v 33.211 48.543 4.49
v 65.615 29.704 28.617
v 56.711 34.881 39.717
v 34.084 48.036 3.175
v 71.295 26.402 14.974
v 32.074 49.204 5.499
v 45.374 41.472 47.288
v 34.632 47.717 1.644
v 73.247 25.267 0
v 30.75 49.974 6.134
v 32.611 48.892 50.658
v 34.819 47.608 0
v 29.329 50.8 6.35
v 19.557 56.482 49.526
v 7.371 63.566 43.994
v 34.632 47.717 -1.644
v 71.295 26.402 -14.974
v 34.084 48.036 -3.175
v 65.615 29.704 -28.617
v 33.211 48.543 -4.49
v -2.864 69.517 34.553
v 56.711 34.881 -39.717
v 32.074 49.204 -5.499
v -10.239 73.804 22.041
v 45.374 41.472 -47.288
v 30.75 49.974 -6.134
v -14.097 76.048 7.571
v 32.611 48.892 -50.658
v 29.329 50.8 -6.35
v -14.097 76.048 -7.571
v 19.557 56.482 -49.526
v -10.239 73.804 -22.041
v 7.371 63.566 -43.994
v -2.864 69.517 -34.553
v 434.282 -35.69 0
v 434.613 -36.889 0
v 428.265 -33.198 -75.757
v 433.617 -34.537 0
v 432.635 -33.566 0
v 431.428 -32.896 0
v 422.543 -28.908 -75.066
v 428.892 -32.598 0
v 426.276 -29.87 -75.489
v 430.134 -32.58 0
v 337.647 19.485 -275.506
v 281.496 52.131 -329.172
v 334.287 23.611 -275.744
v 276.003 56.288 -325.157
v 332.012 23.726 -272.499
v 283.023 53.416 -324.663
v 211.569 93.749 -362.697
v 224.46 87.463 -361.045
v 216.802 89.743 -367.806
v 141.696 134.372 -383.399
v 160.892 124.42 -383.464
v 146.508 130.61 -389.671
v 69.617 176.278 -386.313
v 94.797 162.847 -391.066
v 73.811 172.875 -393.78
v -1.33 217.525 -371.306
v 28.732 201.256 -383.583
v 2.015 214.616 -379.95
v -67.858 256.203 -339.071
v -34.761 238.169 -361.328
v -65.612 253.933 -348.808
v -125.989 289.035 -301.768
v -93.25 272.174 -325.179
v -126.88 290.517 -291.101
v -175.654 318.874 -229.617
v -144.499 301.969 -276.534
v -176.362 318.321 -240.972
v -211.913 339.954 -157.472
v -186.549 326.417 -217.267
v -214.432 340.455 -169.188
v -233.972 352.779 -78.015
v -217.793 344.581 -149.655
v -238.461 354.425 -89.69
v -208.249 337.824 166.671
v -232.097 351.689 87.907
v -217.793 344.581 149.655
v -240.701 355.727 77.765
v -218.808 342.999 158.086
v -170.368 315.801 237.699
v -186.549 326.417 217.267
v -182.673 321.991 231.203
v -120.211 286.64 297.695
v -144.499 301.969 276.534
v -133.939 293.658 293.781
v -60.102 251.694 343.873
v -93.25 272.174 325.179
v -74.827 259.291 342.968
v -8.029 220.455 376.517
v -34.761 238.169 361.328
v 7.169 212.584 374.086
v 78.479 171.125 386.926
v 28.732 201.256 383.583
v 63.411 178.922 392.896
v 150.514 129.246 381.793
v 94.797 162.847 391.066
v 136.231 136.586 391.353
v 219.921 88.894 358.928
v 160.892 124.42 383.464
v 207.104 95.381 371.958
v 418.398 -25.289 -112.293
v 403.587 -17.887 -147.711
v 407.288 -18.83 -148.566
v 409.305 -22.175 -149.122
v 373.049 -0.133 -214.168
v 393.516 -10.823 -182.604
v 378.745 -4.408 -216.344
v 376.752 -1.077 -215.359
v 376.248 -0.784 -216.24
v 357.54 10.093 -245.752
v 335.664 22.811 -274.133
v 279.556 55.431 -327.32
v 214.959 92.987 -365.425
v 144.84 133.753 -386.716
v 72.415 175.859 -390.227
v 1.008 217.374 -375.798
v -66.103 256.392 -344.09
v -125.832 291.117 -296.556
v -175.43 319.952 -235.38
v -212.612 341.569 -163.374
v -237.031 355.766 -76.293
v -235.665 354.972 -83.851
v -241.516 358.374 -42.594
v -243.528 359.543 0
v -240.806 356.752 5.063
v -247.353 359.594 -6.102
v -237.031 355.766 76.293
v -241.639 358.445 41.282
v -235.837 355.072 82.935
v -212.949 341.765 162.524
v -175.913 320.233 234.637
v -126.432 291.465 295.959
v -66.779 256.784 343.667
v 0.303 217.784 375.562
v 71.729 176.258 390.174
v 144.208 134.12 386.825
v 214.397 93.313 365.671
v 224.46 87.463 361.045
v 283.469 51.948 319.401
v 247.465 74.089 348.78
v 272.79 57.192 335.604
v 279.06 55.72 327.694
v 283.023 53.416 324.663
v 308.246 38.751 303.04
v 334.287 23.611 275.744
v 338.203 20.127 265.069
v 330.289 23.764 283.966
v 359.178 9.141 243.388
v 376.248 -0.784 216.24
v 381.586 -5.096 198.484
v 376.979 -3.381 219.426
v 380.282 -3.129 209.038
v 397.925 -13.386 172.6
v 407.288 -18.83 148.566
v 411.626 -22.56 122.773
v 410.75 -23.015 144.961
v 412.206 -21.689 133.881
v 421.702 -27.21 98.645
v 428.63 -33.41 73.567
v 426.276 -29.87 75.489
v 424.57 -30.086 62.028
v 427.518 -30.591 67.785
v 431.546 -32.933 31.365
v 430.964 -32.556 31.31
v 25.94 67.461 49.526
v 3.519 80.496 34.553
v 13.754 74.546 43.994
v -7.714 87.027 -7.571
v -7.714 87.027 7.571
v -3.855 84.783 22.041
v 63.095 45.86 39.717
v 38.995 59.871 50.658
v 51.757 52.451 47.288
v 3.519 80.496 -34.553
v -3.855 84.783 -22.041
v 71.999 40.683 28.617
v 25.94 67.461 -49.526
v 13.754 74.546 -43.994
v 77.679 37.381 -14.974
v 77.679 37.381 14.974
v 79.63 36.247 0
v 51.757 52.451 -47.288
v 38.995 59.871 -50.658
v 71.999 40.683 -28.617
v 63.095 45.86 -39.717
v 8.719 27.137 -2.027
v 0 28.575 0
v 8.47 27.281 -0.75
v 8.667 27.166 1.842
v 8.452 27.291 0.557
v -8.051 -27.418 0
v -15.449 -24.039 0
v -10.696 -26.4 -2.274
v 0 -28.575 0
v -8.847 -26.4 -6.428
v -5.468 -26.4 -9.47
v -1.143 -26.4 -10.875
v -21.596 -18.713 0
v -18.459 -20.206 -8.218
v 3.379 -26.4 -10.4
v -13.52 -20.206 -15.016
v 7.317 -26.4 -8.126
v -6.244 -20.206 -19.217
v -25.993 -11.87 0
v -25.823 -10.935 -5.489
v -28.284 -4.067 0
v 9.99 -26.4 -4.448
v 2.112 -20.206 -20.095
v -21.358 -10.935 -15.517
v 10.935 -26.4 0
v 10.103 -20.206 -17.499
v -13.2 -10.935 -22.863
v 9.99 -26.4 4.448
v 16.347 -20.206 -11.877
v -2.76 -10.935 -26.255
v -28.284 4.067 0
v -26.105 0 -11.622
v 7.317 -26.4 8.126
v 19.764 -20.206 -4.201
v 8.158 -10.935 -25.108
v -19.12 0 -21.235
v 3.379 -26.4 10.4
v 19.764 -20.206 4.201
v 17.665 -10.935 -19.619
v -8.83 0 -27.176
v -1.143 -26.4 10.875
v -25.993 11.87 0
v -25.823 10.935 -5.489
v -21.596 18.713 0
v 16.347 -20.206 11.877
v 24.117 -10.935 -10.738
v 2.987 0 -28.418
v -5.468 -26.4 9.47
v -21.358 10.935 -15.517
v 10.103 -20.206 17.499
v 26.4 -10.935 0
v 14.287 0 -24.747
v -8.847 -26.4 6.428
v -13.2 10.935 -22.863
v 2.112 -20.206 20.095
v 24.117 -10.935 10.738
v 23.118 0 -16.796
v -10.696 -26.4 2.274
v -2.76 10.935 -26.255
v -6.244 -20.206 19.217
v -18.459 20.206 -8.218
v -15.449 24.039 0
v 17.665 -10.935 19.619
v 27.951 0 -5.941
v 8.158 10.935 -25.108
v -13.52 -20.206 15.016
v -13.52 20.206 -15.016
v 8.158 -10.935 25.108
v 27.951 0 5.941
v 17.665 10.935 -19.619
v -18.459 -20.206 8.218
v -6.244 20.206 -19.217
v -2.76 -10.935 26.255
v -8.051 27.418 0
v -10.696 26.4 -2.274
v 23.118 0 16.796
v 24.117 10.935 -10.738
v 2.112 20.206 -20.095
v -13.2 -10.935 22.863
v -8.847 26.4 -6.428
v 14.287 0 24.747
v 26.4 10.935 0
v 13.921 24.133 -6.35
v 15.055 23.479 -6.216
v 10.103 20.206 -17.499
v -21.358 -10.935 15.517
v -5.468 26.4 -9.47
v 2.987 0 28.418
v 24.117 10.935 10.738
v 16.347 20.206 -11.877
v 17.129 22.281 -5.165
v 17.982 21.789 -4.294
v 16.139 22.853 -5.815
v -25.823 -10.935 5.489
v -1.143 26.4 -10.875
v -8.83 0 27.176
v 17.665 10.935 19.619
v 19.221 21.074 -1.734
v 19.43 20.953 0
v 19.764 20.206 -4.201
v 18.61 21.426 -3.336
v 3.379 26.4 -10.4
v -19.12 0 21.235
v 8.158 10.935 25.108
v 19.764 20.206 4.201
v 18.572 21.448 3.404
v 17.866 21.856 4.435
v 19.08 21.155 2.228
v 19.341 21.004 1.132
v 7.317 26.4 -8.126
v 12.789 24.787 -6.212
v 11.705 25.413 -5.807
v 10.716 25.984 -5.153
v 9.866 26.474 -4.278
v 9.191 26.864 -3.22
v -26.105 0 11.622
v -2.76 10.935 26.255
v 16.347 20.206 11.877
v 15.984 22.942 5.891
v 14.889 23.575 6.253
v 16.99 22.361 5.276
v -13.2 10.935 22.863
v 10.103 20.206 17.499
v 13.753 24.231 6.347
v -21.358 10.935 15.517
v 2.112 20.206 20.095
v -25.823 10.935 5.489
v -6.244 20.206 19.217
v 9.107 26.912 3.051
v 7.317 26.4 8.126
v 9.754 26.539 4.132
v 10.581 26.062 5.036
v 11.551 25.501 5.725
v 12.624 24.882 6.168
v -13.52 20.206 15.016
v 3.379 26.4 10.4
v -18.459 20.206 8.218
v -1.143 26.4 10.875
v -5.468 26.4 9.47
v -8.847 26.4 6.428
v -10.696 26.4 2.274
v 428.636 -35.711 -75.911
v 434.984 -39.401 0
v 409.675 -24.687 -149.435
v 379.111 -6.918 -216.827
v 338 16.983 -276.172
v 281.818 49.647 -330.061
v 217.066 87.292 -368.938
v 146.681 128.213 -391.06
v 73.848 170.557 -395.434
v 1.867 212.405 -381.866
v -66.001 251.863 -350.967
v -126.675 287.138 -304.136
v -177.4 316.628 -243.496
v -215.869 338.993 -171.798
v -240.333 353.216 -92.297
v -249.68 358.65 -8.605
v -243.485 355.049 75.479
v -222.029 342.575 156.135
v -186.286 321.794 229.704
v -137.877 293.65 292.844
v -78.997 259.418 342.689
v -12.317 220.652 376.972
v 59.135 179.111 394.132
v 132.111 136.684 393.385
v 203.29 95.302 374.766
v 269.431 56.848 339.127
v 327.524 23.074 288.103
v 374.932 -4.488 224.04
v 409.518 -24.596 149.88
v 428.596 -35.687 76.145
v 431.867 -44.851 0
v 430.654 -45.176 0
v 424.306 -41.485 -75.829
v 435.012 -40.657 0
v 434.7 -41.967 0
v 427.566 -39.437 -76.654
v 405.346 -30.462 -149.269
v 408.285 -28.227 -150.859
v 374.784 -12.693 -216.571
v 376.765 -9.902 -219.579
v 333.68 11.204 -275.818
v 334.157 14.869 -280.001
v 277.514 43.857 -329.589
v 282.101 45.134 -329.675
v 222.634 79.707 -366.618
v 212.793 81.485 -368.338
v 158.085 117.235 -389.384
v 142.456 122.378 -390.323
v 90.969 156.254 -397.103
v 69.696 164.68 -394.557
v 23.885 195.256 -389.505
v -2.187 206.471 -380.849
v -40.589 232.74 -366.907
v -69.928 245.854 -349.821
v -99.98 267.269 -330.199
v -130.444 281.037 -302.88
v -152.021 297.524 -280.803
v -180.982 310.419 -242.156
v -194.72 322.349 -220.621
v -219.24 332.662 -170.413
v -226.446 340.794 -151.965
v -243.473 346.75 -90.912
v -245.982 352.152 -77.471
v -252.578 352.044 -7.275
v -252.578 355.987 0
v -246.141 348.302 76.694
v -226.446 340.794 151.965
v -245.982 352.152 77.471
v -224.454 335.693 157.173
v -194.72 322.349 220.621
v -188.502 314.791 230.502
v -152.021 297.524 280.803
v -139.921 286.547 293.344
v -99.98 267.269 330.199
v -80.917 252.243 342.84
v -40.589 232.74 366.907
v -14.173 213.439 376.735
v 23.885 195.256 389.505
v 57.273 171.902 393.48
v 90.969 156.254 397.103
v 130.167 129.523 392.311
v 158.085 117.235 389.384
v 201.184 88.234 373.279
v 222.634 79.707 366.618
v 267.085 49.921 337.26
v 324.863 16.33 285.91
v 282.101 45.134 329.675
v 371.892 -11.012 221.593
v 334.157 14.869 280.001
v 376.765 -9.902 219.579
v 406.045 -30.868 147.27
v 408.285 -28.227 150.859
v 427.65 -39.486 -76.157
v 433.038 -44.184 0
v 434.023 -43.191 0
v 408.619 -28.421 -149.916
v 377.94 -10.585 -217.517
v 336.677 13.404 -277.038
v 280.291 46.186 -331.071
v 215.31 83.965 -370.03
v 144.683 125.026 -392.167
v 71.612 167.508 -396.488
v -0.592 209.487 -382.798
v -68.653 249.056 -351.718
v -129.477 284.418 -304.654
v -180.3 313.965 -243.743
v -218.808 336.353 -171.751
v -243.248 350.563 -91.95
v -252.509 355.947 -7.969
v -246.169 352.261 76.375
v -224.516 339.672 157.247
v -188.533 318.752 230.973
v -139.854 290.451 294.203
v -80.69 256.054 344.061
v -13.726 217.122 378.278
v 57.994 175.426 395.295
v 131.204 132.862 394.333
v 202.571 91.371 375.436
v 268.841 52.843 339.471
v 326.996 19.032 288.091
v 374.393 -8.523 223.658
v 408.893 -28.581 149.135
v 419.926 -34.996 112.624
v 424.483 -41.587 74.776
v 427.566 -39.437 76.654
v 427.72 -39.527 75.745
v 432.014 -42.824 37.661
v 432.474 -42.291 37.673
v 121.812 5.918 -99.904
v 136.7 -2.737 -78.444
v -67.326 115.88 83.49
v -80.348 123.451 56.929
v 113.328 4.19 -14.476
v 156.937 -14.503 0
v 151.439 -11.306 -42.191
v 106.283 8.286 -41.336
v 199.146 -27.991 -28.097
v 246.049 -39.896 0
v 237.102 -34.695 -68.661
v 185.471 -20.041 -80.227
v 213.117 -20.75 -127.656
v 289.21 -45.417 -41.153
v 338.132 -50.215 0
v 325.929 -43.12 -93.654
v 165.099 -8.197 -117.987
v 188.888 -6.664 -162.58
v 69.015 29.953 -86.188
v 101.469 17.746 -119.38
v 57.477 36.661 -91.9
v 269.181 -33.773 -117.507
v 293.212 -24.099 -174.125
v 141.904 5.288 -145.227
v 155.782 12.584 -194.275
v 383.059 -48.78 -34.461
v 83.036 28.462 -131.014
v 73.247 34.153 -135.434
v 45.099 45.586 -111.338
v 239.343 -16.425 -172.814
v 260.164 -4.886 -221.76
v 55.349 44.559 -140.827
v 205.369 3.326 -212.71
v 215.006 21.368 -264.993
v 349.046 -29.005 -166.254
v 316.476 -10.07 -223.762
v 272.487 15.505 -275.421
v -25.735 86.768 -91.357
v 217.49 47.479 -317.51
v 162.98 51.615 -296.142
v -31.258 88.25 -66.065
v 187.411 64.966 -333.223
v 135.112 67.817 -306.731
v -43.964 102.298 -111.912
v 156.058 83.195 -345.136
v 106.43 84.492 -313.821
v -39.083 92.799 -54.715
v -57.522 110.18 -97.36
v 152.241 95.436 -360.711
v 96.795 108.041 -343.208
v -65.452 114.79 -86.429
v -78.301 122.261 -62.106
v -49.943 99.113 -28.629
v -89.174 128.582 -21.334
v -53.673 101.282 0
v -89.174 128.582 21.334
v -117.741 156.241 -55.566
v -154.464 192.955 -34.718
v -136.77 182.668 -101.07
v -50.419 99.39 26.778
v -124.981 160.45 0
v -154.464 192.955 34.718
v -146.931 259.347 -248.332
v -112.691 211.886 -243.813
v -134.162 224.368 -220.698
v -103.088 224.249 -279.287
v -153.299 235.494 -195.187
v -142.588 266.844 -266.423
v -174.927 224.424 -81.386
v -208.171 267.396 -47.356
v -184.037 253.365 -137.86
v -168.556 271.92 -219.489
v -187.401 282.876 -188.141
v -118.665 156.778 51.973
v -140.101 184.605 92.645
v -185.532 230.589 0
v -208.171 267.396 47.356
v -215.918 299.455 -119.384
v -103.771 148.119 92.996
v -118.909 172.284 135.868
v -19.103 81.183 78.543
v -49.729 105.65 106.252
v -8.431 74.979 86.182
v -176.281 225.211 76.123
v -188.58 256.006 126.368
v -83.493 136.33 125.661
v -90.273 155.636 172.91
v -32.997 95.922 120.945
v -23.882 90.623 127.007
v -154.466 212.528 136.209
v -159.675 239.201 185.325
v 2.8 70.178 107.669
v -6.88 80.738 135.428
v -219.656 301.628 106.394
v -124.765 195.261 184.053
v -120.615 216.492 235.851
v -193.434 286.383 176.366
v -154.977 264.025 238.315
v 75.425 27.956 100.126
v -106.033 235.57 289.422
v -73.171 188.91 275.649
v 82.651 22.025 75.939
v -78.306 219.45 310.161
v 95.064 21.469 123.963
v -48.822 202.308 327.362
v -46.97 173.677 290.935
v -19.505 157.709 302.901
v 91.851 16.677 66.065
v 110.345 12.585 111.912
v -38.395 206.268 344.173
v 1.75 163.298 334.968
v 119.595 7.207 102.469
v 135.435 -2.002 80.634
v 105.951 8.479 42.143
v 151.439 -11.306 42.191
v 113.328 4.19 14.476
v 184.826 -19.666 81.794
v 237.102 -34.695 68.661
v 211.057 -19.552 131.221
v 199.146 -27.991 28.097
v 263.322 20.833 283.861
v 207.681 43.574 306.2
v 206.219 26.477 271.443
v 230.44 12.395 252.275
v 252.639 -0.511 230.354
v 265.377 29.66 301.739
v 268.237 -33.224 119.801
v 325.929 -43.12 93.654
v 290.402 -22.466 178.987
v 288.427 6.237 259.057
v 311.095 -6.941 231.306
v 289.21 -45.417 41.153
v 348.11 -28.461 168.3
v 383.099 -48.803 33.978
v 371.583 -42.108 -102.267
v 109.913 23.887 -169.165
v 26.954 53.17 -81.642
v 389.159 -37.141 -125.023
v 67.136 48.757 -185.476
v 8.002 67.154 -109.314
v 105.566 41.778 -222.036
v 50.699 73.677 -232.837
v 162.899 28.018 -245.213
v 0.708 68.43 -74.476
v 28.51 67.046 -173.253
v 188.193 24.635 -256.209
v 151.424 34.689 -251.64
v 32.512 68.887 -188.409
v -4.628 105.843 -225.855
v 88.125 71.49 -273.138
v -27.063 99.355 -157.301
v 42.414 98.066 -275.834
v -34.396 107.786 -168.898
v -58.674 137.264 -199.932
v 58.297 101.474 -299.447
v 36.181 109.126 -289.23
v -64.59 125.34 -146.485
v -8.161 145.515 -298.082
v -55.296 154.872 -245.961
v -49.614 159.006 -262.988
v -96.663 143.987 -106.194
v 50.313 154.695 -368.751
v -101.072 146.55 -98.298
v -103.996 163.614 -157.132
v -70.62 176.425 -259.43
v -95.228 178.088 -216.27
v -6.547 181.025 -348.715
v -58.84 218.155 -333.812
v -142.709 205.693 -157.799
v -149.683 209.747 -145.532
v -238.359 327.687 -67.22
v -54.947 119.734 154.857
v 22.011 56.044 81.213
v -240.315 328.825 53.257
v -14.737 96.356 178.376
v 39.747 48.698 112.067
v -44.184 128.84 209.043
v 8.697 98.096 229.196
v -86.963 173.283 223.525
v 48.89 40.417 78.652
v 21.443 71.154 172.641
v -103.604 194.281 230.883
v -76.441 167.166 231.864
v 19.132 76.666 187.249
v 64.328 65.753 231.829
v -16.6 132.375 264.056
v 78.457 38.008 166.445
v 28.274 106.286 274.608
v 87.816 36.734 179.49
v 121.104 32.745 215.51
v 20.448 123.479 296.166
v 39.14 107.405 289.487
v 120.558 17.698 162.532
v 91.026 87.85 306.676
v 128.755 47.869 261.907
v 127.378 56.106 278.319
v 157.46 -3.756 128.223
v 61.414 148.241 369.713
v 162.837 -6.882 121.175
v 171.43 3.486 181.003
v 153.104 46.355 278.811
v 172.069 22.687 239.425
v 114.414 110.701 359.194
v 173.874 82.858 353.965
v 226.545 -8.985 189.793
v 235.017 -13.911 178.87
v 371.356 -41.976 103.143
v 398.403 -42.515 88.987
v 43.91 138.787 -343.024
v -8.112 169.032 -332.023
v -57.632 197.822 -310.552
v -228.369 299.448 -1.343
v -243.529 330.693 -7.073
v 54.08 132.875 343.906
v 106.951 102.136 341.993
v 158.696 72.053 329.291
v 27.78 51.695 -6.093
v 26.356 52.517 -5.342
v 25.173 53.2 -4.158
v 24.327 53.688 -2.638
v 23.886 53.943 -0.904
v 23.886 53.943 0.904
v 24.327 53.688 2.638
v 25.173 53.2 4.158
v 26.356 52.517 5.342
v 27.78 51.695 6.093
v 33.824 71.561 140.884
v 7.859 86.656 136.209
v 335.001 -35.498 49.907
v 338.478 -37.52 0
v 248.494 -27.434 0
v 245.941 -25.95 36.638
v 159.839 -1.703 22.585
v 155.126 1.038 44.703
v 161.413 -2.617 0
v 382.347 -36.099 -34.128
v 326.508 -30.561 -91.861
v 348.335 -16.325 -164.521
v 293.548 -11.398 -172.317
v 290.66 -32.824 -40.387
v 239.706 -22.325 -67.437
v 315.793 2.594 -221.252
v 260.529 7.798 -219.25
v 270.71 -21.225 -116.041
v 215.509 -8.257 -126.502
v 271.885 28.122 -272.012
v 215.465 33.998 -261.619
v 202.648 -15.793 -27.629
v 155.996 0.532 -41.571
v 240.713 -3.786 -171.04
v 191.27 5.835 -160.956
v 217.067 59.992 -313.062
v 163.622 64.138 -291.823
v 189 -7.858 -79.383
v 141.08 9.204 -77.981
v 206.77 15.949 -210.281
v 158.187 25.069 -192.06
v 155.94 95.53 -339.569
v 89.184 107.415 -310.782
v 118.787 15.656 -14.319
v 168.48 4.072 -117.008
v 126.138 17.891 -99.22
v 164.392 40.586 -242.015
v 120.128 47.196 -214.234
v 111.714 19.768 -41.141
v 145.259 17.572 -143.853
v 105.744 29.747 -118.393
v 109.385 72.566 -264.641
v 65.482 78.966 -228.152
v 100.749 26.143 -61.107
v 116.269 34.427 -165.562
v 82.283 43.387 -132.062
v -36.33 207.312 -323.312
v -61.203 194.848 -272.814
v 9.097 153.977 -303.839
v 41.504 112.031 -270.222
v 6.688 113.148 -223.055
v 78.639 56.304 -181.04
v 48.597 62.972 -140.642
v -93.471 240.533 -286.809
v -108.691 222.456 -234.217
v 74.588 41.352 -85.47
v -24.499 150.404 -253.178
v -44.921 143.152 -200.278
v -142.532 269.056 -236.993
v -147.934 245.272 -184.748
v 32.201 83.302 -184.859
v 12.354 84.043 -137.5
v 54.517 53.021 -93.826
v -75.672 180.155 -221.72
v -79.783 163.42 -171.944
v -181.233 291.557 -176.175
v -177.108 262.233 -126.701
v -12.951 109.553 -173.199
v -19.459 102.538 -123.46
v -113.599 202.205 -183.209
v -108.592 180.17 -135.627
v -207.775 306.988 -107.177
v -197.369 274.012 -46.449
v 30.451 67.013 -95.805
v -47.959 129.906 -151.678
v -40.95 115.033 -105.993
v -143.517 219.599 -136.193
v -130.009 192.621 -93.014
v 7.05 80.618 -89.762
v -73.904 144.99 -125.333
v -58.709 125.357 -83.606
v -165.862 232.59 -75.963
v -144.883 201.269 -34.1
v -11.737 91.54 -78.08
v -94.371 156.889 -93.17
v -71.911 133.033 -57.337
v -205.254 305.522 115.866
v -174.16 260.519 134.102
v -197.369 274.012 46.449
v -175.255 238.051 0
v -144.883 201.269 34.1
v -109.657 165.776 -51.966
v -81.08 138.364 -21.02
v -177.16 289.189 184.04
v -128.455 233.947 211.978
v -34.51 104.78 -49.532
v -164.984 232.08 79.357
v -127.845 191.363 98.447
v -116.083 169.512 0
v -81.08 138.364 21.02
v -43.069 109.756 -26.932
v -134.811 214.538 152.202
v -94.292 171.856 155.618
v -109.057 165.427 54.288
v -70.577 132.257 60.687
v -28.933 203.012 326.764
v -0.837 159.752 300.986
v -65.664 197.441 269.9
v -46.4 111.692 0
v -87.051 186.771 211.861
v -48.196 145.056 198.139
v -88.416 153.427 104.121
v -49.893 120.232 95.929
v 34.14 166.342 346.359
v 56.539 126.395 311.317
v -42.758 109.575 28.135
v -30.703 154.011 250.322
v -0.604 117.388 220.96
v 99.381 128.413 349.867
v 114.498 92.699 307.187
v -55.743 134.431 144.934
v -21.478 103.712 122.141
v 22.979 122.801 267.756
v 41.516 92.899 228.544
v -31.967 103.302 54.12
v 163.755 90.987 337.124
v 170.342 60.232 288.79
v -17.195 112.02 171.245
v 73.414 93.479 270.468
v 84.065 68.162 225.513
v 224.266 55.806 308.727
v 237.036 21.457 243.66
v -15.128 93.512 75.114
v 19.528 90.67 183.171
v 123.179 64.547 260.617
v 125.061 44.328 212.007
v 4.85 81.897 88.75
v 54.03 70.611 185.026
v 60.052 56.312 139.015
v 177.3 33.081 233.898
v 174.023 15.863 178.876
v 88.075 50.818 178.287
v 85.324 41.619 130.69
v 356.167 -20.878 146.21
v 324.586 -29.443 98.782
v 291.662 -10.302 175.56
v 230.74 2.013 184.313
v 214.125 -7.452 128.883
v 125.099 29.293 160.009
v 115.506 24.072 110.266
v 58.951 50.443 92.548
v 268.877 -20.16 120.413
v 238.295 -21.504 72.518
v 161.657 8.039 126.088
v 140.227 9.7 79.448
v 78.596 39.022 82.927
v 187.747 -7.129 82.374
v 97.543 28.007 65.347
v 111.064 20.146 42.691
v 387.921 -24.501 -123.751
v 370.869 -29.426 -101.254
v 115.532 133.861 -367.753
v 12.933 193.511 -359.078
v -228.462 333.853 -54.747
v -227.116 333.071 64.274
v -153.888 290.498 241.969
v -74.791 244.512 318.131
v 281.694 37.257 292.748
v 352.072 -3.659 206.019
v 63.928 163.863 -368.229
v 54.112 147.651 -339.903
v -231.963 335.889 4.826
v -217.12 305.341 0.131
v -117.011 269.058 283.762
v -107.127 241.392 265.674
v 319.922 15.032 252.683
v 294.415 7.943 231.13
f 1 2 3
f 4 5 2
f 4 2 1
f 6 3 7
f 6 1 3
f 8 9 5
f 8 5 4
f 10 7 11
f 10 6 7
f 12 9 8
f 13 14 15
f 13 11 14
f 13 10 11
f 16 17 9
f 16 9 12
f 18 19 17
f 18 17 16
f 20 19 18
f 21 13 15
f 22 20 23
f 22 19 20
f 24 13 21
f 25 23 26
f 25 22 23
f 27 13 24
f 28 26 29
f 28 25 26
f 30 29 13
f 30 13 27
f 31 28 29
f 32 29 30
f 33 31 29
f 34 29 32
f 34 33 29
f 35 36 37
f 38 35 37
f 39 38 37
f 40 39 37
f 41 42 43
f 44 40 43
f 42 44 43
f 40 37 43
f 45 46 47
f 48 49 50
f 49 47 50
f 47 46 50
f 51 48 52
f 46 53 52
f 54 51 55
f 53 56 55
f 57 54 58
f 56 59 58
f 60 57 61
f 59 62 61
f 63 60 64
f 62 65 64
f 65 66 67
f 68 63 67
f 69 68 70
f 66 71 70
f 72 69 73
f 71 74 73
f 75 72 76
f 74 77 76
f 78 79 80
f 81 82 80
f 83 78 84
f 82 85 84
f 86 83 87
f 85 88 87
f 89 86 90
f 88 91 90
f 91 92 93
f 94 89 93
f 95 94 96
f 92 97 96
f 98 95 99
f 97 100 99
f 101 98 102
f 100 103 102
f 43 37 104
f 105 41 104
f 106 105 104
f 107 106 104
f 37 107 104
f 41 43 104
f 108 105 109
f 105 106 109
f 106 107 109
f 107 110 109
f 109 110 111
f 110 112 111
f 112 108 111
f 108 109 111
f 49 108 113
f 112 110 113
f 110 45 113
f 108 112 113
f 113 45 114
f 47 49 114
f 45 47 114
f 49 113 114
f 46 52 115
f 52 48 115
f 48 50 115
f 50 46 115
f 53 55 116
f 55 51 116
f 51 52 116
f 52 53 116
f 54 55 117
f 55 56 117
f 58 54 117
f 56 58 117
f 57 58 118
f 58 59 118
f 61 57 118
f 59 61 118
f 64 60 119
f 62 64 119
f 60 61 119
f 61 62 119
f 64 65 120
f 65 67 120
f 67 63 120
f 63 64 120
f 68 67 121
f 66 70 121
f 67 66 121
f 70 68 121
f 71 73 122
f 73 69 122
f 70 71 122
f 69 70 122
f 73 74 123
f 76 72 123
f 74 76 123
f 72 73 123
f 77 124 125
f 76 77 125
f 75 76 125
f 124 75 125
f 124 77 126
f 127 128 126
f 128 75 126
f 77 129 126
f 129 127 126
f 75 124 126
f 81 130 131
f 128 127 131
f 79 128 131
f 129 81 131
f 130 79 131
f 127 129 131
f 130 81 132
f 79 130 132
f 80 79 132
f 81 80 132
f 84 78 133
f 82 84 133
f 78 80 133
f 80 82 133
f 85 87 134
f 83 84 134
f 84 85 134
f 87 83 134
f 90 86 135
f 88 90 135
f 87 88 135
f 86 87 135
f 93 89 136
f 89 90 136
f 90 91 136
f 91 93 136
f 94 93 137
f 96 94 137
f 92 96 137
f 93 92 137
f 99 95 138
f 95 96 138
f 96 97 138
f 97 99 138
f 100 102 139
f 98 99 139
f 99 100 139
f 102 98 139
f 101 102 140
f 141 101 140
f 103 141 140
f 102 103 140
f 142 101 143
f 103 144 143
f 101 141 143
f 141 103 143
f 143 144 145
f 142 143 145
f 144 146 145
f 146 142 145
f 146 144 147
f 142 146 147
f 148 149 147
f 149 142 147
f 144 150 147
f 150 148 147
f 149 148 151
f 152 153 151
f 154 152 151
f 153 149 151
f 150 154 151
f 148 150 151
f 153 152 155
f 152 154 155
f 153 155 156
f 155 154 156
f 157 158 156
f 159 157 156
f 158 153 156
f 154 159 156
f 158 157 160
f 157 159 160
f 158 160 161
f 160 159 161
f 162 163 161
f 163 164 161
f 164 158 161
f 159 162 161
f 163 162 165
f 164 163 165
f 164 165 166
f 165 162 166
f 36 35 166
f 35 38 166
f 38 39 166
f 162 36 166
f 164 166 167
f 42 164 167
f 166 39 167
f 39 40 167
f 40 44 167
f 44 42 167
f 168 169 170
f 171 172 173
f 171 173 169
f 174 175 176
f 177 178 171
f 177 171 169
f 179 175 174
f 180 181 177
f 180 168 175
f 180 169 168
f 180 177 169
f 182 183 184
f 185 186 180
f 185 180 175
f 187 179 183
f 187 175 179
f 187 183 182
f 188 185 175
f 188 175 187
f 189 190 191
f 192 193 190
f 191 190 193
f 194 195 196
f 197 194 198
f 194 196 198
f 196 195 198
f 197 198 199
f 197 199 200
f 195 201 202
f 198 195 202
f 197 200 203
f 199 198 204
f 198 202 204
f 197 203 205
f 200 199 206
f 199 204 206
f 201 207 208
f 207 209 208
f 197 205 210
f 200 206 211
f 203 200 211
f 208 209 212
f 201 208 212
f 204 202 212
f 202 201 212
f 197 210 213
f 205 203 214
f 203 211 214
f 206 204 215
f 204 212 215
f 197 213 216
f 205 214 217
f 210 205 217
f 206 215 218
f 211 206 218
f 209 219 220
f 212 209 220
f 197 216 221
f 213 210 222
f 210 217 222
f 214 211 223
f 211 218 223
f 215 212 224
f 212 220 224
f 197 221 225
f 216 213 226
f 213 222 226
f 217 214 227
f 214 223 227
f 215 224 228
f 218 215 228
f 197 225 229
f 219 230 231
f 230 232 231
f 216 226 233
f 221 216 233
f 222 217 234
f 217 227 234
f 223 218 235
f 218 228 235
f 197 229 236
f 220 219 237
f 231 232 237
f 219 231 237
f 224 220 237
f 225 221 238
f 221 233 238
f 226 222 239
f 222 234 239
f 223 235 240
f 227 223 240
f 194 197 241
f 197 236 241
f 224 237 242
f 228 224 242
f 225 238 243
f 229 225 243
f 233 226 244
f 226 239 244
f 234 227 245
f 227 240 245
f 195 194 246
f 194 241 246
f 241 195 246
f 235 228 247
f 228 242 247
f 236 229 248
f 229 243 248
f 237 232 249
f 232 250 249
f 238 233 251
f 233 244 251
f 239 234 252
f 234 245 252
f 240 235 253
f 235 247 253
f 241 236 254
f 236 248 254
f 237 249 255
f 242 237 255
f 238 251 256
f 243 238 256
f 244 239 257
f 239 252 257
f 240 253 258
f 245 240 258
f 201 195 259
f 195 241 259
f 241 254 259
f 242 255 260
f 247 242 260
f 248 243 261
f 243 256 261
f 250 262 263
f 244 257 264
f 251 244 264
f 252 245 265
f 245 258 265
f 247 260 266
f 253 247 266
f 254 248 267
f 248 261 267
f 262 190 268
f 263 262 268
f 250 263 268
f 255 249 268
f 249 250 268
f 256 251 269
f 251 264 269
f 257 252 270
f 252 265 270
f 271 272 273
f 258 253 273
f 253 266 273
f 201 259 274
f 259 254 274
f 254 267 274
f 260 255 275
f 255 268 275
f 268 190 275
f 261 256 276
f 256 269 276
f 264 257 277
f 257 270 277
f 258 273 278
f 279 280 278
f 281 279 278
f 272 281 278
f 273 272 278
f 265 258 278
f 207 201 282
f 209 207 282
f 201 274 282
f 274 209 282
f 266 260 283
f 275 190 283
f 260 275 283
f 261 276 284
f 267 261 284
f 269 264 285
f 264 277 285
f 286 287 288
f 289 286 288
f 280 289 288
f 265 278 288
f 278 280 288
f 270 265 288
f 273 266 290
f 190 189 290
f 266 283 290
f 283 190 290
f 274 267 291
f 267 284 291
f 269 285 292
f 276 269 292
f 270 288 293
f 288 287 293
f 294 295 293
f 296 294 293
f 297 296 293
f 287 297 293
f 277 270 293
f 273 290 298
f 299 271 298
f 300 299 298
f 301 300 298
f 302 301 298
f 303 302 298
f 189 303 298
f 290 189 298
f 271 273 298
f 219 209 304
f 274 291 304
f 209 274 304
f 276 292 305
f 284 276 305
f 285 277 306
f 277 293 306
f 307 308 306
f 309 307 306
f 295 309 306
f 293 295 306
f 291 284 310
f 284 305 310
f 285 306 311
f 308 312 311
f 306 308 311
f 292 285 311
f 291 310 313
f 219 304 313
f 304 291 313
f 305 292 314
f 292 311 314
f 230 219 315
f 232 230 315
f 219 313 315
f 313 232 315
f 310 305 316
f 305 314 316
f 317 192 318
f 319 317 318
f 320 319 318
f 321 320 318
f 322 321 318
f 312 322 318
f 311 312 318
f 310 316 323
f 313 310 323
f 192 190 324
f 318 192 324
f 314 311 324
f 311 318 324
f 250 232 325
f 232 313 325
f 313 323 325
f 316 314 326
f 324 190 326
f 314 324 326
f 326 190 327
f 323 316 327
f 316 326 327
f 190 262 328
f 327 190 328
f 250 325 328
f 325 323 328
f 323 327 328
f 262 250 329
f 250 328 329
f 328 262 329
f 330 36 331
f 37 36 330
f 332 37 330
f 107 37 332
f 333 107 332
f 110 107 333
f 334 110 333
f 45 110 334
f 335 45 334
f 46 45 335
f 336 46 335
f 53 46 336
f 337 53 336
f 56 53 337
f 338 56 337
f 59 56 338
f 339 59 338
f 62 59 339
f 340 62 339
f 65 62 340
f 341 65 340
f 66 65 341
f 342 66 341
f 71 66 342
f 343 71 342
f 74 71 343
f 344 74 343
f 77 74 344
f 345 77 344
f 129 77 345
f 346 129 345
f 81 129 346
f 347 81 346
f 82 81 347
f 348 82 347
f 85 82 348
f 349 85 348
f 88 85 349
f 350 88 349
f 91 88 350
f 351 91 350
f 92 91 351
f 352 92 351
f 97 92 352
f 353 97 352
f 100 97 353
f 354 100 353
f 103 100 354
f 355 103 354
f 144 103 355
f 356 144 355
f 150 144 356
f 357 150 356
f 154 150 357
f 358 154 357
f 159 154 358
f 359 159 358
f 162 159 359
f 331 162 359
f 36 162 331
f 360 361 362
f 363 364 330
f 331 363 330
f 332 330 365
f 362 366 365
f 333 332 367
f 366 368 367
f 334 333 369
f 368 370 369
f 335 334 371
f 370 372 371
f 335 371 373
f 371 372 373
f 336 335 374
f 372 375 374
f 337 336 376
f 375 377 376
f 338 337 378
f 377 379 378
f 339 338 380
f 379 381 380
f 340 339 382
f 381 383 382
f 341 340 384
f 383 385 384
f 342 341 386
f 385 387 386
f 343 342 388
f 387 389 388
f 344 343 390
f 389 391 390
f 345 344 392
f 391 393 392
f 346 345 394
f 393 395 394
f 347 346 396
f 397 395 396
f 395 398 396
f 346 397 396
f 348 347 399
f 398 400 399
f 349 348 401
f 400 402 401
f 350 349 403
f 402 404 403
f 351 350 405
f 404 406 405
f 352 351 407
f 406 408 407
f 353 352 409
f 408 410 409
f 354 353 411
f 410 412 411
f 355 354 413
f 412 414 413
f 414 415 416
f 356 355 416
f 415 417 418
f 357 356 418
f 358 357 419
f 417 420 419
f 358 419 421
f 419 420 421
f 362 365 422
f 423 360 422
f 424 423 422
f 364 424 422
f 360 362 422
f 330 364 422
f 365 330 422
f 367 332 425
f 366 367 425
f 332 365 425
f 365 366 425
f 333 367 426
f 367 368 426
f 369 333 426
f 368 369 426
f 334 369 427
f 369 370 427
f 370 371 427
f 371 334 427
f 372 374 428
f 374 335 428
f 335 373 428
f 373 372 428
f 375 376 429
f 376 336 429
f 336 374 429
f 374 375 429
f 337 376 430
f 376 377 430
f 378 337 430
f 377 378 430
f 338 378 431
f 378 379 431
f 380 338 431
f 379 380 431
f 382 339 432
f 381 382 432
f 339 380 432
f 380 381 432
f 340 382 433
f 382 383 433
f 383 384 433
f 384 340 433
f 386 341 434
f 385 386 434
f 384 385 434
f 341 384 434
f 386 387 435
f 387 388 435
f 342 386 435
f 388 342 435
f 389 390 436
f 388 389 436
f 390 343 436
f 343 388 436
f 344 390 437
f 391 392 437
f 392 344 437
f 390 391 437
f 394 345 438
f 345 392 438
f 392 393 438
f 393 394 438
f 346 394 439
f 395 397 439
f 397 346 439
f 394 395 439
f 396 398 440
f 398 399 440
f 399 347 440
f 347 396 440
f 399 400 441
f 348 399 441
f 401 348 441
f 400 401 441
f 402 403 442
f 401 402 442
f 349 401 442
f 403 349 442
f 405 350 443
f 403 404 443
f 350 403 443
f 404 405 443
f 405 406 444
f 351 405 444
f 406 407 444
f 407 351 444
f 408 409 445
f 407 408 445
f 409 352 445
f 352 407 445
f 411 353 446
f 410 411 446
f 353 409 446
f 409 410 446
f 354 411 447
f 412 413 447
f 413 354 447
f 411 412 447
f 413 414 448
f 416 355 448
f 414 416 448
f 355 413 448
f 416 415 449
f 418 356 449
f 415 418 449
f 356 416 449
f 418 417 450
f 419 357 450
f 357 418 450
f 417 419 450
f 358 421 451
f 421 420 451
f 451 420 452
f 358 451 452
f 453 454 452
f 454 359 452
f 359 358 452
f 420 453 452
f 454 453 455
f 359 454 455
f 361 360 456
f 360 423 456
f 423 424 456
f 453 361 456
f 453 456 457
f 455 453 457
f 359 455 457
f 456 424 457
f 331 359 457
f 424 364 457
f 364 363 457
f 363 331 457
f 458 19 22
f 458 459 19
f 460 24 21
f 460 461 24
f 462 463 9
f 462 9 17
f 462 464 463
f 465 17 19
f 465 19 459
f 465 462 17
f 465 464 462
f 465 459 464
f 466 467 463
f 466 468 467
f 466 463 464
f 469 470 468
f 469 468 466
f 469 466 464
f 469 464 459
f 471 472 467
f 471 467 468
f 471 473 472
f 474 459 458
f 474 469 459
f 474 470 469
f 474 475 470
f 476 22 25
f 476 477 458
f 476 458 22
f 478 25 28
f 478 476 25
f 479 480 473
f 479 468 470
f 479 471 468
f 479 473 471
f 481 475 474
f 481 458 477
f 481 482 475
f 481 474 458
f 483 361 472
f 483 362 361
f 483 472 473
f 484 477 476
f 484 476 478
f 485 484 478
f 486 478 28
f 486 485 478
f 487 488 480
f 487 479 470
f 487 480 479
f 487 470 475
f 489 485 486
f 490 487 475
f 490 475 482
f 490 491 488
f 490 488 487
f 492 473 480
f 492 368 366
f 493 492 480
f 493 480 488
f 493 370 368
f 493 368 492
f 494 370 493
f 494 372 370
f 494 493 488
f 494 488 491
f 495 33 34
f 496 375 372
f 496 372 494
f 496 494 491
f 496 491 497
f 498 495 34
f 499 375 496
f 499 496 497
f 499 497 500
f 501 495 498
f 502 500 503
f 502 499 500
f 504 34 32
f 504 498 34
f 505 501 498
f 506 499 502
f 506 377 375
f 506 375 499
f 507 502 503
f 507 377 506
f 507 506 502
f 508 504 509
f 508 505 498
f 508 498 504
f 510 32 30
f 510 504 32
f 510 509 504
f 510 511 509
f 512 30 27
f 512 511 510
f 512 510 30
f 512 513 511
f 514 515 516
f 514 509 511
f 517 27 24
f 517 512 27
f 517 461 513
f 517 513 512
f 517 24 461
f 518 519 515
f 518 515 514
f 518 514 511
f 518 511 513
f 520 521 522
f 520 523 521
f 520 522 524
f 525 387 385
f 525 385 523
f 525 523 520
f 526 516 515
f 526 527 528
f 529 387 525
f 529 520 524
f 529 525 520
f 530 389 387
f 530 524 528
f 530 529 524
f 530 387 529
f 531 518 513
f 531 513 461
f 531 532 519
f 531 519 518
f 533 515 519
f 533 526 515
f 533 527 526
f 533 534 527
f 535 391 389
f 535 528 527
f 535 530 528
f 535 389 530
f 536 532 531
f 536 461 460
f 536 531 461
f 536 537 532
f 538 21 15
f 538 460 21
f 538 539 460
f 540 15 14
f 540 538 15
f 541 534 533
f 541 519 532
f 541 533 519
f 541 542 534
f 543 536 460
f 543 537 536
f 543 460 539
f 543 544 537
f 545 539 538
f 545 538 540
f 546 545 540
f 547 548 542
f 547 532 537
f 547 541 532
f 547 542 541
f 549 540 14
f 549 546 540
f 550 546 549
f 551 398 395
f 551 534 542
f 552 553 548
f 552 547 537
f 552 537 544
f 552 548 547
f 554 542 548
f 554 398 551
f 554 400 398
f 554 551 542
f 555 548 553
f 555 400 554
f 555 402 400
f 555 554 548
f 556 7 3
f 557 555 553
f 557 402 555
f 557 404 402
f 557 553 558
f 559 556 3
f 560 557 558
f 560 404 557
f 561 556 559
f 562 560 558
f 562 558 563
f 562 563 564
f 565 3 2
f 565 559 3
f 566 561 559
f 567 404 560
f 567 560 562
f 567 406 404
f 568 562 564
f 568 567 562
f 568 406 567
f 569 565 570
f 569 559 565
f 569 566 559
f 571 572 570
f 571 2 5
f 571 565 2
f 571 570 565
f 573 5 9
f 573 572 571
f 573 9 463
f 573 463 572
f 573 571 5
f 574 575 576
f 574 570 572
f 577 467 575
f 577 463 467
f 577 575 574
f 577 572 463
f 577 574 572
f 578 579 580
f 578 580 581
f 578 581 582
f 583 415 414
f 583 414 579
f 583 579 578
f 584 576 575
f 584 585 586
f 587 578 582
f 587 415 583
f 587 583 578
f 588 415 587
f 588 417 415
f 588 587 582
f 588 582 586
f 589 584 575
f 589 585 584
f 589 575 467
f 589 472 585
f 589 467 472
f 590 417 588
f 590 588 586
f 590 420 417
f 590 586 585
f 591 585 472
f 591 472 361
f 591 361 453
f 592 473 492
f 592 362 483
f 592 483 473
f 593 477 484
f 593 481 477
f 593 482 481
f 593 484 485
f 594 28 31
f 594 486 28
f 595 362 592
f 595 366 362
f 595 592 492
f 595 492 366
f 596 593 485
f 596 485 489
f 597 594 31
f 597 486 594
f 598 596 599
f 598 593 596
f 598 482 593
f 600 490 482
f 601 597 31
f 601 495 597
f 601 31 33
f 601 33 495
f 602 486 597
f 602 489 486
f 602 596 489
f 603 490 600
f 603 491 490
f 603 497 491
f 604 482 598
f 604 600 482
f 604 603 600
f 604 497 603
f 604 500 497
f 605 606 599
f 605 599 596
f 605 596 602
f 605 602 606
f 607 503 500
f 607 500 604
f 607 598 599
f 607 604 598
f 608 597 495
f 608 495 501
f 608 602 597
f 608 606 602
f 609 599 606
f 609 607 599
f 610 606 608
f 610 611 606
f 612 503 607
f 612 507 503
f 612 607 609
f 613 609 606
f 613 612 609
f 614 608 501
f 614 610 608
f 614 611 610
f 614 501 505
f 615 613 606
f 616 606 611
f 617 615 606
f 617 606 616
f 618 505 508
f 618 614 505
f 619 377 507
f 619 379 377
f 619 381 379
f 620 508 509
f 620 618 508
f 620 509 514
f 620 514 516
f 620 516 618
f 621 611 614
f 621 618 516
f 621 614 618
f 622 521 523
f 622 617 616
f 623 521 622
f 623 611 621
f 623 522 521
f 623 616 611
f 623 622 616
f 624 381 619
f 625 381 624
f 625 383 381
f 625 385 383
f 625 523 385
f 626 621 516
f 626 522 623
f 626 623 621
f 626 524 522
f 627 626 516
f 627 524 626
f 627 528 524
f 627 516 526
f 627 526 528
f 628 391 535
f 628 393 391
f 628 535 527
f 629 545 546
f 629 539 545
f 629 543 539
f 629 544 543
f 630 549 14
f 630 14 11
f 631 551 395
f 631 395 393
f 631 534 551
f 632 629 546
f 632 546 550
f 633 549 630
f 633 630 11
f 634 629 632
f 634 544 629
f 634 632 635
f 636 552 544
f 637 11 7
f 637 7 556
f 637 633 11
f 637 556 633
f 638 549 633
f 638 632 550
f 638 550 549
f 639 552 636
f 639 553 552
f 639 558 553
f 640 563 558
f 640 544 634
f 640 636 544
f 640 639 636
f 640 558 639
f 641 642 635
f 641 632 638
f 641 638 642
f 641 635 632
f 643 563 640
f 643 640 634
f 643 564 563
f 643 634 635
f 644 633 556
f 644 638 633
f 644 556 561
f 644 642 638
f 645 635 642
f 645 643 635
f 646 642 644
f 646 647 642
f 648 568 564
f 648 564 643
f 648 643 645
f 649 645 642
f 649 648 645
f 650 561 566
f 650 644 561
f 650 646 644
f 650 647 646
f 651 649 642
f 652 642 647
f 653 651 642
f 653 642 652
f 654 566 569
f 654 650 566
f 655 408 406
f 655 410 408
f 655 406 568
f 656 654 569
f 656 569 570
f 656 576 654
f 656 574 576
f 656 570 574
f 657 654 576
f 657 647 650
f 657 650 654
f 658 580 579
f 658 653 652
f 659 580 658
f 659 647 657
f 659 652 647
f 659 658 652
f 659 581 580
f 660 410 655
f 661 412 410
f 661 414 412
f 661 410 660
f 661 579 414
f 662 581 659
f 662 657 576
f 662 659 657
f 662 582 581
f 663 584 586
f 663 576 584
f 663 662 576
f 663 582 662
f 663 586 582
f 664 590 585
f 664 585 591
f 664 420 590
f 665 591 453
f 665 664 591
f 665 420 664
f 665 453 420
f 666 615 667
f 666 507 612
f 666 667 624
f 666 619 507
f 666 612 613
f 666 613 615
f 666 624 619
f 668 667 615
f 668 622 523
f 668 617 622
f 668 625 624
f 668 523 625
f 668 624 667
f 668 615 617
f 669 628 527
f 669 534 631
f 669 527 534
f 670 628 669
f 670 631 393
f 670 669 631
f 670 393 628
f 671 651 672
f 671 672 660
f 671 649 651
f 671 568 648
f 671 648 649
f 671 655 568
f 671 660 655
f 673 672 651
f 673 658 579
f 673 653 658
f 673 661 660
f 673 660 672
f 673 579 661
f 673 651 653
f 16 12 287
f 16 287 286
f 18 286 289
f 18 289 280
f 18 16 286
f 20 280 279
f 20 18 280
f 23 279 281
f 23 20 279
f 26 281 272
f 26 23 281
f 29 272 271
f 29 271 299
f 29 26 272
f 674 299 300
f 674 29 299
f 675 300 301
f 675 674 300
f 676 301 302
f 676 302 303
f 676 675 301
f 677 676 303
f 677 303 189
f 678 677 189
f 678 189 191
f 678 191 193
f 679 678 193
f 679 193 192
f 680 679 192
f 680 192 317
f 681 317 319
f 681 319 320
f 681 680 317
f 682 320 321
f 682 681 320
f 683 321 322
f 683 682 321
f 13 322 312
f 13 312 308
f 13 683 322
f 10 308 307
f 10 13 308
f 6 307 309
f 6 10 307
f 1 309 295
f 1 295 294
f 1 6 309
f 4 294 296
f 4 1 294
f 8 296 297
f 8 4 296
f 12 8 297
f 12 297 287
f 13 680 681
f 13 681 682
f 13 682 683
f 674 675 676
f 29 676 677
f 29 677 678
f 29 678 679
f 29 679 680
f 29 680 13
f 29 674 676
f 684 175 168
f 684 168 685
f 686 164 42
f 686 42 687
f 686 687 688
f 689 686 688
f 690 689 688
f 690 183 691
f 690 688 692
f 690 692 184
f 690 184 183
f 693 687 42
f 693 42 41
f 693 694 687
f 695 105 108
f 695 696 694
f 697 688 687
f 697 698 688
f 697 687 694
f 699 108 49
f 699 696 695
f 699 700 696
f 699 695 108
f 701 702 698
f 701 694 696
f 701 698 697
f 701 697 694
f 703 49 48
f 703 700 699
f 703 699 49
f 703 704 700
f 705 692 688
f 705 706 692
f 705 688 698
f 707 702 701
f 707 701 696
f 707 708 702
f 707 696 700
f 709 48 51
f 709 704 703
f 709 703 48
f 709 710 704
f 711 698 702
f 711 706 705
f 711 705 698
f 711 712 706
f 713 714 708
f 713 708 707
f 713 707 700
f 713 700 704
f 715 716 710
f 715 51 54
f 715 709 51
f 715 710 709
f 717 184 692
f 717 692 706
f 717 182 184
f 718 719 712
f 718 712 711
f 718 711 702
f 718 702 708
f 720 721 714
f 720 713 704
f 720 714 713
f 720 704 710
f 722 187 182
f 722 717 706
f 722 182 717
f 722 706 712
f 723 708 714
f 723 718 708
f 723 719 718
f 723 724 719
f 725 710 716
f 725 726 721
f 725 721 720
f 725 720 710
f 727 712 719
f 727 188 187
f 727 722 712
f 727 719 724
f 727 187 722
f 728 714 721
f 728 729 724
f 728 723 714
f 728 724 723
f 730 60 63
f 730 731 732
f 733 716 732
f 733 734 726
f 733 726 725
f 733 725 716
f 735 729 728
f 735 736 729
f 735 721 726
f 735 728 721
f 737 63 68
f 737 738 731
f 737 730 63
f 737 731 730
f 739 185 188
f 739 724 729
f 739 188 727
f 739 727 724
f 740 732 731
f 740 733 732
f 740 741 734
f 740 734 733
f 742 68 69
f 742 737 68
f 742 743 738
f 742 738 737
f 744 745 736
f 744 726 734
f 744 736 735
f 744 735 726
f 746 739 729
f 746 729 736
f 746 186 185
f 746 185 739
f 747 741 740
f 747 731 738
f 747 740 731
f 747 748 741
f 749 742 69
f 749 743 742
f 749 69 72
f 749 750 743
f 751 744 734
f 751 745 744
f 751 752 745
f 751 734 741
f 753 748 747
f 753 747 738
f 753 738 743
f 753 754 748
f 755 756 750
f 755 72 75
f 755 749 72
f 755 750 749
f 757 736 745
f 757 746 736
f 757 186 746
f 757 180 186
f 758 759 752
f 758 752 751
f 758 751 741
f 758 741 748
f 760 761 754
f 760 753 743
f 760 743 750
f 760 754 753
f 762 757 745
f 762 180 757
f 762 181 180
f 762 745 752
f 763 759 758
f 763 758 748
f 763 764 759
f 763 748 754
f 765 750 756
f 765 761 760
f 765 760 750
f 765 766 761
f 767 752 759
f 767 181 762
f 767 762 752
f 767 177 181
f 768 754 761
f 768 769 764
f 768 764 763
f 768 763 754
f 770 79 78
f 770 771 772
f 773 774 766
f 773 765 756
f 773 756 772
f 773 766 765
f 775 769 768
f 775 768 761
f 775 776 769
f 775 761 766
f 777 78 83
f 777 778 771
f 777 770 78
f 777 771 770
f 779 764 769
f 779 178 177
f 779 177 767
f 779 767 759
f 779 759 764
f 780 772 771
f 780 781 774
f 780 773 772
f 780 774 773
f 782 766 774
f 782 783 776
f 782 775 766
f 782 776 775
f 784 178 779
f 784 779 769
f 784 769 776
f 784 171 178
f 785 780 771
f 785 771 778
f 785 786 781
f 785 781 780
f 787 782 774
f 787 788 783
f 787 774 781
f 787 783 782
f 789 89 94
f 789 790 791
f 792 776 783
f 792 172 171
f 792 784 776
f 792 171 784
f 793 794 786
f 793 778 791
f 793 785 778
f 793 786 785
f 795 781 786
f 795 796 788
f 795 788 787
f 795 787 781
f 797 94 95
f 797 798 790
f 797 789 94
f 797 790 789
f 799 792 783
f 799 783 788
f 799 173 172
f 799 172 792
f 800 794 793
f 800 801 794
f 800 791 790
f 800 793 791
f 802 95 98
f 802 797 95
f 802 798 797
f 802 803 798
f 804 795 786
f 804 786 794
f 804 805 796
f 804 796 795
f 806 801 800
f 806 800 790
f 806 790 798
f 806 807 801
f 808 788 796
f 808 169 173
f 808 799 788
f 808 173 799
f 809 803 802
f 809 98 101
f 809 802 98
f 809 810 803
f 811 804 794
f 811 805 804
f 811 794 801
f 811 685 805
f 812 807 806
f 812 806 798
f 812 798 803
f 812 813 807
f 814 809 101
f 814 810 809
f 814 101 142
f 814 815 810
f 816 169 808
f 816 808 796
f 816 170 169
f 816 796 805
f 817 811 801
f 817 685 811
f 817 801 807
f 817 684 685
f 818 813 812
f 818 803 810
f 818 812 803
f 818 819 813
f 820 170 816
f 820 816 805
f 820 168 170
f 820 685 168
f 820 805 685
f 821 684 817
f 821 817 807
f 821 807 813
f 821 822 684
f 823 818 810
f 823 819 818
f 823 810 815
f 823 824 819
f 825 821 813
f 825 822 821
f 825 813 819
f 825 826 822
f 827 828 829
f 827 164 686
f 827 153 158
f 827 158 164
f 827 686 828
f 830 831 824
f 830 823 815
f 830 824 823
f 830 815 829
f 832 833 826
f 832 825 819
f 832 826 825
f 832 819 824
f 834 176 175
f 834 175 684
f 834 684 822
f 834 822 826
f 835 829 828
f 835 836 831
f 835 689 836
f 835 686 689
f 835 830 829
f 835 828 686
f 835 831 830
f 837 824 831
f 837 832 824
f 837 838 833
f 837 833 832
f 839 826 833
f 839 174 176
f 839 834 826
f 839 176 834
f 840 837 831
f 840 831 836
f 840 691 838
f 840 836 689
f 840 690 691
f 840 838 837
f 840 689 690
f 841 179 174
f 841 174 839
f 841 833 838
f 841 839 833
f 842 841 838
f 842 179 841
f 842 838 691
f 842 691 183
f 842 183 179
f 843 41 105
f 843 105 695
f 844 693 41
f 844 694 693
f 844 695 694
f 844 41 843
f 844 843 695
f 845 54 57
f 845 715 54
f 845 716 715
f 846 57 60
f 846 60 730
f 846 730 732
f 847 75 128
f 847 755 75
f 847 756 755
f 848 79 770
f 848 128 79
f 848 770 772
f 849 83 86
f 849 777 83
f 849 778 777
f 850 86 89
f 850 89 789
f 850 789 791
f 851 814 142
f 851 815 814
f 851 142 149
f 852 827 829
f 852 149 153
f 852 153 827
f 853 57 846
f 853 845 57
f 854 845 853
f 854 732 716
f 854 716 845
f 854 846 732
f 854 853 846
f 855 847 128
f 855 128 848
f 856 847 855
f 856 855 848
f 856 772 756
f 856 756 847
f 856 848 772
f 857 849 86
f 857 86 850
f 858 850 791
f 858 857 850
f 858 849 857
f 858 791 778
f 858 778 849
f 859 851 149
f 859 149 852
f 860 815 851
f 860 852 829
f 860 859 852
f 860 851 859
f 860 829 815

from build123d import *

# Parameters (mm, degrees)
SWEEP1_PROFILE_R = 6.35
FILLET2_R        = 5.08


with BuildPart() as part:
    # Sketch1 → Revolve1 (revolve)
    with BuildSketch(Plane.XY):
        with BuildLine():
            Line((0, 28.575), (0, -28.575))
            ThreePointArc((0, -28.575), (-28.575, 0), (0, 28.575))
        make_face()
    revolve(axis=Axis((0, 28.575, 0), (0, -1, 0)))

    # Sweep1: sweep along a path in Sketch3
    with BuildLine(Plane.XY) as sweep1_path:
        Line((0, 0), (29.329393675, 50.8))
    # Sweep1 profile (on start of the path) → Sweep1 (sweep)
    with BuildSketch(Plane(origin=(0, 0, 0), x_dir=(0.8660254037844399, -0.4999999999999978, 0), z_dir=(0.4999999999999978, 0.8660254037844399, 0))):
        Circle(SWEEP1_PROFILE_R)
    sweep(path=sweep1_path.line)

    # Sketch48 → Revolve4 (revolve)
    with BuildSketch(Plane.XY):
        with BuildLine():
            Line((29.329393675, 50.8), (73.246601158, 25.267297697))
            ThreePointArc((73.246601158, 25.267297697), (248.565164439, -40.386076535), (435.729393675, -44.45))
            Line((435.729393675, -44.45), (433.874323966, -31.886214091))
            ThreePointArc((433.874323966, -31.886214091), (250.963827213, -27.914652523), (79.629776734, 36.246599568))
            Line((79.629776734, 36.246599568), (35.712569251, 61.779301871))
            Line((35.712569251, 61.779301871), (29.329393675, 50.8))
        make_face()
    revolve(axis=Axis((29.329393675, 50.8, 0), (0.5026122500572271, 0.8645119583281723, 0)))

    # Fillet2
    fillet2_edges = [part.edges().sort_by_distance(p)[0] for p in [
        (-254.516797313, 356.847157088, 0),
        (-242.680690294, 361.451130441, 0),
    ]]
    fillet(fillet2_edges, radius=FILLET2_R)


solid = part.part
